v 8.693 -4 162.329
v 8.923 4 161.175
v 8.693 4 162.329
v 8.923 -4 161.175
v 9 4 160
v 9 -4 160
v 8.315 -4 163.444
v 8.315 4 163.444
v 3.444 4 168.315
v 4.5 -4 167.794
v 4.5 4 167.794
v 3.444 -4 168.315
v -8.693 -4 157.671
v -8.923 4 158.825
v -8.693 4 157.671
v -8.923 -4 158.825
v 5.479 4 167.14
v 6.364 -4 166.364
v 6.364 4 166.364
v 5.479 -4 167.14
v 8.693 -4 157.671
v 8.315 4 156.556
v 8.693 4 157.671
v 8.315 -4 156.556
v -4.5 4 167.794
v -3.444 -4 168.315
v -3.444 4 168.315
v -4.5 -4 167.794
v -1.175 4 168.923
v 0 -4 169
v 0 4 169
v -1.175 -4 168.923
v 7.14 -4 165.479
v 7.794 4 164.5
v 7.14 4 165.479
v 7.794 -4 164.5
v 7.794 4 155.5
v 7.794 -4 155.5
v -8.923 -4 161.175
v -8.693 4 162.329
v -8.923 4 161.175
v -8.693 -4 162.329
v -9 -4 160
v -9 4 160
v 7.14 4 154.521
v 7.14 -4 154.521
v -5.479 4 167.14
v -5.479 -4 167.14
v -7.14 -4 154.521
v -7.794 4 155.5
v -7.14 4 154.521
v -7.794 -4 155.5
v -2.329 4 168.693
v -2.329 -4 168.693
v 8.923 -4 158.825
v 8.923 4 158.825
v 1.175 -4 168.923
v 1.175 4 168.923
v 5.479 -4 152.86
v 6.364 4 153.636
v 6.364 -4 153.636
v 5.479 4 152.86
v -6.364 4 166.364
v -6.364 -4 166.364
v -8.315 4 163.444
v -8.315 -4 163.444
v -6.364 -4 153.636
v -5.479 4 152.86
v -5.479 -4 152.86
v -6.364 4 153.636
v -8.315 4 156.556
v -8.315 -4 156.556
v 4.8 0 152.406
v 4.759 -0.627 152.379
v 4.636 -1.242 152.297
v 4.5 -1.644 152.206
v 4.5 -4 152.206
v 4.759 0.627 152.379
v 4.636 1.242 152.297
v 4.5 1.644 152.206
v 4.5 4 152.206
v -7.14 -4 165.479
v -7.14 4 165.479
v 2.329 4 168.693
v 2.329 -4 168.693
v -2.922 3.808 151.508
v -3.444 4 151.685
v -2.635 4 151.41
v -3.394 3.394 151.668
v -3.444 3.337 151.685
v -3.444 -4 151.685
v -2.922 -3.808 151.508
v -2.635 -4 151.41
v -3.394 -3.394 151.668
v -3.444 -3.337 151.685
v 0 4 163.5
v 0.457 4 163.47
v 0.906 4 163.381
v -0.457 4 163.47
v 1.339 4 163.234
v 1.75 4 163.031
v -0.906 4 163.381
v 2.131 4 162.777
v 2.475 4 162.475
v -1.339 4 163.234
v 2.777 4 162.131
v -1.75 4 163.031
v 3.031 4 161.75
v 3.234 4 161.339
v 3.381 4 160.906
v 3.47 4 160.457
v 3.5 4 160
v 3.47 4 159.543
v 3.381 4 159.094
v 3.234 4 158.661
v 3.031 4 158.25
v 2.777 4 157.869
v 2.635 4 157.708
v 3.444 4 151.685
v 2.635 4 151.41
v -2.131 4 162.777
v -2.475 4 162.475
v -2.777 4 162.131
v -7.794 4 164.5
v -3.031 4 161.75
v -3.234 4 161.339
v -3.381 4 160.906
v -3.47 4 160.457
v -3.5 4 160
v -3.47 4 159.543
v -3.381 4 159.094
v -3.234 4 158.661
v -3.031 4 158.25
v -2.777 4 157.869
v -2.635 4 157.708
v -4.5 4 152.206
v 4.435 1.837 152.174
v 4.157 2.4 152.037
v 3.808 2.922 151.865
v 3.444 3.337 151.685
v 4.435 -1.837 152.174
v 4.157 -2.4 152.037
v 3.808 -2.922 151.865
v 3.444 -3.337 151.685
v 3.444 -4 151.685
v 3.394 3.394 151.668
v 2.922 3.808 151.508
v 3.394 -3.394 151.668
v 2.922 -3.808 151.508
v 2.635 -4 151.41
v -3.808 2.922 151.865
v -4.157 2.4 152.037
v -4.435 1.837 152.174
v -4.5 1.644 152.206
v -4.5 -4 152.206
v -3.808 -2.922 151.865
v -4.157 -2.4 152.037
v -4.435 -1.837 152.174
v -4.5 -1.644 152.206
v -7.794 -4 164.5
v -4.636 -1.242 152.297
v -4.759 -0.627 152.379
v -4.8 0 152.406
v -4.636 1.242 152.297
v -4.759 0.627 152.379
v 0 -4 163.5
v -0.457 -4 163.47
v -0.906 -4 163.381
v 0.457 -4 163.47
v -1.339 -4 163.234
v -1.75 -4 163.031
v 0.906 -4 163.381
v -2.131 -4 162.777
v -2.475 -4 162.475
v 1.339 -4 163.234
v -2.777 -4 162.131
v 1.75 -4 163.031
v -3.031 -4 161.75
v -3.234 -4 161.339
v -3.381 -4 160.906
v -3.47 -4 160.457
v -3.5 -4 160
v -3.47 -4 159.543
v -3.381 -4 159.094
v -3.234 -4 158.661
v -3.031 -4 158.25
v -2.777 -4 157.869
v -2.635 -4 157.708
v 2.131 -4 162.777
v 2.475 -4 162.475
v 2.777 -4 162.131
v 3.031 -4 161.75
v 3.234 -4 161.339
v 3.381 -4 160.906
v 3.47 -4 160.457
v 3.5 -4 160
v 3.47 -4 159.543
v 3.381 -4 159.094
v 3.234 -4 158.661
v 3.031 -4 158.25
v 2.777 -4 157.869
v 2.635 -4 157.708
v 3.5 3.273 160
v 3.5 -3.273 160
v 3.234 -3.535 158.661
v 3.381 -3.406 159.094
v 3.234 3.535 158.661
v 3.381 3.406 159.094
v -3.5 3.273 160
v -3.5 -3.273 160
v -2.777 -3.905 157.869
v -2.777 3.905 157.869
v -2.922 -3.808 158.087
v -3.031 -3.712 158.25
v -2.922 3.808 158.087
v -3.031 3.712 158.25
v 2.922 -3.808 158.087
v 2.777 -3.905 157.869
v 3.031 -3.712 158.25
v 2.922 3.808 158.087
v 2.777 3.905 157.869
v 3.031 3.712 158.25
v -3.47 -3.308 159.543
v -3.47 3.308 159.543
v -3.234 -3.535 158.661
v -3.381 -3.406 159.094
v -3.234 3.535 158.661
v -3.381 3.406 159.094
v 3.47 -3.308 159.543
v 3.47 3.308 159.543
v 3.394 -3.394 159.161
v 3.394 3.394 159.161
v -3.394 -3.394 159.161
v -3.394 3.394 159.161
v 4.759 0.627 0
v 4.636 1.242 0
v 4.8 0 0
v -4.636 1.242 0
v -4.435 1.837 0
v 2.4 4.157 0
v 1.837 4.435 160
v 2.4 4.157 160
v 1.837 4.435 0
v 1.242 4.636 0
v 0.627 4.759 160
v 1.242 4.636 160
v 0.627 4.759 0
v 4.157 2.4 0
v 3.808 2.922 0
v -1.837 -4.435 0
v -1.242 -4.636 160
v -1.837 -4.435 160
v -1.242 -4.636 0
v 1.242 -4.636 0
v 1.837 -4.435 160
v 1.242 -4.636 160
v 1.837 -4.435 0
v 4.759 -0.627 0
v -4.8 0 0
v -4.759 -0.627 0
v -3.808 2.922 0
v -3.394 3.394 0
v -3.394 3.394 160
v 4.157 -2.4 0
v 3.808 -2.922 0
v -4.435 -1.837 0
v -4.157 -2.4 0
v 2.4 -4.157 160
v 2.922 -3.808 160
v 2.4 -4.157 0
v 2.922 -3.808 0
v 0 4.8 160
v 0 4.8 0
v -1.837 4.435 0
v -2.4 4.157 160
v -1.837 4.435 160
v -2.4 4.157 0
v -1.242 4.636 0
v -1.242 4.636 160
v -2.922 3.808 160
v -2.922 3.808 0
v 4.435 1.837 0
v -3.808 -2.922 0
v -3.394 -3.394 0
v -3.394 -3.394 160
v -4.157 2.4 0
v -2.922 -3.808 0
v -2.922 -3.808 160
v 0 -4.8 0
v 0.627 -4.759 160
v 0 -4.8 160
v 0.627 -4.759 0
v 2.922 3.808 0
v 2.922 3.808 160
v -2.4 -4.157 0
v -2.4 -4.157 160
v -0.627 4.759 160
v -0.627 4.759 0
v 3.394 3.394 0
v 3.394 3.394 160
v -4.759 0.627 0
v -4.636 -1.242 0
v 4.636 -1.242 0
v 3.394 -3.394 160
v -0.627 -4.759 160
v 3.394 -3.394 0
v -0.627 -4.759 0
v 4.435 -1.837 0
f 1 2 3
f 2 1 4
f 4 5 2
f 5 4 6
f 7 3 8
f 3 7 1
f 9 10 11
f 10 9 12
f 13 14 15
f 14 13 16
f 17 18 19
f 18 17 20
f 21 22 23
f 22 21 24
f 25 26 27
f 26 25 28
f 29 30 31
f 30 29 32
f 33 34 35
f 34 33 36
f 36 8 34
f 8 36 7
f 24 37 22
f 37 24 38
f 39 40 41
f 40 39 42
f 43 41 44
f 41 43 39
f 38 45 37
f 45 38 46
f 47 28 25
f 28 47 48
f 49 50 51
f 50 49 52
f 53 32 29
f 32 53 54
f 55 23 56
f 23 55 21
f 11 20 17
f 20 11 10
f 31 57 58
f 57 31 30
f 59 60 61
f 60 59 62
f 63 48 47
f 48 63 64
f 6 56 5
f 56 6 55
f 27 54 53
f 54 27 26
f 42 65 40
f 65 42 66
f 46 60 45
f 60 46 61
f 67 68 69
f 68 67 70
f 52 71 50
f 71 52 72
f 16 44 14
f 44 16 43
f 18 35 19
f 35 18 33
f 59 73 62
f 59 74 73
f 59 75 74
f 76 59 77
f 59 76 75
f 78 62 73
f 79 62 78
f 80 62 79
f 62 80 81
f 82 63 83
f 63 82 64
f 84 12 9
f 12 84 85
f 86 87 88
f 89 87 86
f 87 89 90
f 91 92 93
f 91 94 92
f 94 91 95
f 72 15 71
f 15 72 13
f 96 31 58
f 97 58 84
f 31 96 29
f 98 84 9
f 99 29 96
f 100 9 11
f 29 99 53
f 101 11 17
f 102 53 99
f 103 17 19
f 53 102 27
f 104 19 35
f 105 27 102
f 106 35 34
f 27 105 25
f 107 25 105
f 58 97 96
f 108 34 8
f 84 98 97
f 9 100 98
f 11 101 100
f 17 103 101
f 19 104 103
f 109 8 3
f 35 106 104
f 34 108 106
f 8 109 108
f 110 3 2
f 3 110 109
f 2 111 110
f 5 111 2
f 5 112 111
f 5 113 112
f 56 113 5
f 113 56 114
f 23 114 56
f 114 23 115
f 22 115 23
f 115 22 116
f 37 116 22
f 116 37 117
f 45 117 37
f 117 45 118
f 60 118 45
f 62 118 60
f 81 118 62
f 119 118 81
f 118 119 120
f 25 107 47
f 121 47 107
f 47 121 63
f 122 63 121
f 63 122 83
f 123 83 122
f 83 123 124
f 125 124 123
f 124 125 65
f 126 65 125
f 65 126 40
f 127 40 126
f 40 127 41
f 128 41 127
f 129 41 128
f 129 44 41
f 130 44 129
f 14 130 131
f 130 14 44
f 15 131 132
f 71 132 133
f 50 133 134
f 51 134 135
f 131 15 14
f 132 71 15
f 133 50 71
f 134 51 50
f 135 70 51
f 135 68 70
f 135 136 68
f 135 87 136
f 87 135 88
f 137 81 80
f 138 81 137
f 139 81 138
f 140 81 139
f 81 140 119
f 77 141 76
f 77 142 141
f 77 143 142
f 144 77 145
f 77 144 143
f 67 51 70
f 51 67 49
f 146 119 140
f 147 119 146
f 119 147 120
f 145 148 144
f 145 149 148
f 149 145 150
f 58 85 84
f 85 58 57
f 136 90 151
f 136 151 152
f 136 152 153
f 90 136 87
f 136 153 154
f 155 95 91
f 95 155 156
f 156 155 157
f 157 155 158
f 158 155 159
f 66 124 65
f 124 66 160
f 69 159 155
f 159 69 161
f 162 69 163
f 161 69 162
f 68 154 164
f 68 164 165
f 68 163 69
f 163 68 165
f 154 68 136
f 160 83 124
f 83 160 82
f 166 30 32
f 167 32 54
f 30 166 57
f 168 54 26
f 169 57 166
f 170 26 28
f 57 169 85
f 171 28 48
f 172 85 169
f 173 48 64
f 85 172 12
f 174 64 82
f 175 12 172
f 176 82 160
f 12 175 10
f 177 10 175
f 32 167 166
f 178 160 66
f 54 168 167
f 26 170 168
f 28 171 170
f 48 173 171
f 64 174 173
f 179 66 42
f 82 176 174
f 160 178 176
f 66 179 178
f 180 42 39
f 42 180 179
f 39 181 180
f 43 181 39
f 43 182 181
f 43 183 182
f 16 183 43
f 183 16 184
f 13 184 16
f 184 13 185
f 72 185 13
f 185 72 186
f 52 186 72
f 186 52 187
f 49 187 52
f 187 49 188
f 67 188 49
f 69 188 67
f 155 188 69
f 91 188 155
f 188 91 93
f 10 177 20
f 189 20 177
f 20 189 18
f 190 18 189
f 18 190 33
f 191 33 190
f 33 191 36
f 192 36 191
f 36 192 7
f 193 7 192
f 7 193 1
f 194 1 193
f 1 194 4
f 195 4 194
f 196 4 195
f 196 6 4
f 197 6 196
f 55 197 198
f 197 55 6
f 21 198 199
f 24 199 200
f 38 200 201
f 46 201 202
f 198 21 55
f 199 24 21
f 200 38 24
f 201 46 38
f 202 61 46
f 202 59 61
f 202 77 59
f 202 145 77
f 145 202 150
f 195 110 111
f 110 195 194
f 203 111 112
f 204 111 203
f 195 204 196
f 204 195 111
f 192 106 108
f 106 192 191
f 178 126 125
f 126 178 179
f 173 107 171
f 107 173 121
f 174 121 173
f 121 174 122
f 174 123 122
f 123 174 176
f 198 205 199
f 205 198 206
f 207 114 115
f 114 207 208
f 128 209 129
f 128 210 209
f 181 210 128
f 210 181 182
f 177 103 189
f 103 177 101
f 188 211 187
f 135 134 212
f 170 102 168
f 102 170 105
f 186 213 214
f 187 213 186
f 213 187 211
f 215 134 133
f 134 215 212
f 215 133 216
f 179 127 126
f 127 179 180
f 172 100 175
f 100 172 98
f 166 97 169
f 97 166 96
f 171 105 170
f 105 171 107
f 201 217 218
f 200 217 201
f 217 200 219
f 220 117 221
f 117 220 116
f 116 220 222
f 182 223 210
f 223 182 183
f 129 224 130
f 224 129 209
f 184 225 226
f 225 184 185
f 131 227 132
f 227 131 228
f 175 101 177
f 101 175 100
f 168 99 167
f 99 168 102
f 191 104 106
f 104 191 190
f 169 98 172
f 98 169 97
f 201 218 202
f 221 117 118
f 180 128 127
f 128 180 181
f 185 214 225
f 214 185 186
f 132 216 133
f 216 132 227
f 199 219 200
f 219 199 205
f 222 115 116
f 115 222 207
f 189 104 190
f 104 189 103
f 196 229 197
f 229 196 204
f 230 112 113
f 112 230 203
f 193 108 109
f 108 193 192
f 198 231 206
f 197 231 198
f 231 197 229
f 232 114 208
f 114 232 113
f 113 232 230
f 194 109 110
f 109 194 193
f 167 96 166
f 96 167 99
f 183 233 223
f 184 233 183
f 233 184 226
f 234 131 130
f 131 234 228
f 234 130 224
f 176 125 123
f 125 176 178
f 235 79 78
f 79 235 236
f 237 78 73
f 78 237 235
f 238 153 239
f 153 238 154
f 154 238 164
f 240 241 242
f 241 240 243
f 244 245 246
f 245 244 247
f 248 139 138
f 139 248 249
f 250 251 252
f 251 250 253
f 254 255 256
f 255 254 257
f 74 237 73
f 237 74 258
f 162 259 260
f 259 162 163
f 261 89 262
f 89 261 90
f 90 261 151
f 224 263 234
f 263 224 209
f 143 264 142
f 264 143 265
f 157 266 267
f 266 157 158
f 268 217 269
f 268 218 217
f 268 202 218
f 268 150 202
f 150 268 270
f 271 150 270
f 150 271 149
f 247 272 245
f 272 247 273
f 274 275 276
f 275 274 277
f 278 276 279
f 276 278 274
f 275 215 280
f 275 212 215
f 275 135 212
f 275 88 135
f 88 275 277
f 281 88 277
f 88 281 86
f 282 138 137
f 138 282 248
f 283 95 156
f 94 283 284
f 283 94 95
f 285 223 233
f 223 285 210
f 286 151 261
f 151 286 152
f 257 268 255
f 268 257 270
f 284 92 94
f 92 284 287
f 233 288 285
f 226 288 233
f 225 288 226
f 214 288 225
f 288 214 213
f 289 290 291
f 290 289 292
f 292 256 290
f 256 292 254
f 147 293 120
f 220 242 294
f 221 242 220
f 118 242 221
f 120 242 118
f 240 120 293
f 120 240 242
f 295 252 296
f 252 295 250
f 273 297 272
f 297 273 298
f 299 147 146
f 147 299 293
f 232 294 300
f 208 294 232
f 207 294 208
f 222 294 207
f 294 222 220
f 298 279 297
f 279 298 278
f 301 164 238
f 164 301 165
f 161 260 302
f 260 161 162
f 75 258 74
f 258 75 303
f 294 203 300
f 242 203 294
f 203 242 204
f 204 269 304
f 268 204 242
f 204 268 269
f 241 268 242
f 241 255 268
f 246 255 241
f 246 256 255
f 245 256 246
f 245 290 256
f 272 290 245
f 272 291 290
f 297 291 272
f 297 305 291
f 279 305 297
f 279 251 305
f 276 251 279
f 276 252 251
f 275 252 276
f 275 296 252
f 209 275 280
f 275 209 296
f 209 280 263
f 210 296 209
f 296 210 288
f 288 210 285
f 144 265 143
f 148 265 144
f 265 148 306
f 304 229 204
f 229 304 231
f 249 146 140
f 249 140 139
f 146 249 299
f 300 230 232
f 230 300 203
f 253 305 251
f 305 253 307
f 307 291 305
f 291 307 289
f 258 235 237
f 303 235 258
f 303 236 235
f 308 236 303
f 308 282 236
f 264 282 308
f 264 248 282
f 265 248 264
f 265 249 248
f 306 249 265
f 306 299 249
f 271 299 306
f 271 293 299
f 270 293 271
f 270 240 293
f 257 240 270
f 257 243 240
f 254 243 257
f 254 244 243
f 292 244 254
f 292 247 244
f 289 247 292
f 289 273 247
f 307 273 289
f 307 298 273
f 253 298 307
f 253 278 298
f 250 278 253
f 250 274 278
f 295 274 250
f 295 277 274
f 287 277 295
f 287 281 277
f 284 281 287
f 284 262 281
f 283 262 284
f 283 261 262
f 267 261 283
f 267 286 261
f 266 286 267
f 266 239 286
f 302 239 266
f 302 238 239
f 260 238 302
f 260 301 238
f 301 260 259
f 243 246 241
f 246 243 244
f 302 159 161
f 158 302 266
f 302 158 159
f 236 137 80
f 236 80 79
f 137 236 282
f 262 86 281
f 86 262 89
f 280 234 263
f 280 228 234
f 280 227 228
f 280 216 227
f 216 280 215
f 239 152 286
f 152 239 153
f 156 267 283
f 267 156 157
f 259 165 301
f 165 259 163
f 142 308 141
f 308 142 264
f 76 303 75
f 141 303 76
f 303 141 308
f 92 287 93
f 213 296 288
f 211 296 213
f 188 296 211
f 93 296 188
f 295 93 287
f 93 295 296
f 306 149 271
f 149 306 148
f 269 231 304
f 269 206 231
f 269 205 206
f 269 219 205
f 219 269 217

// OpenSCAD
// TS-PET-C10 - Teaser Arm Rod
$fn = 48; rod_d=9.6; rod_len=160; eye_d=18; eye_hole_d=7;
union(){ cylinder(h=rod_len,d=rod_d); translate([0,0,rod_len]) rotate([90,0,0]) difference(){ cylinder(h=8,d=eye_d,center=true); cylinder(h=10,d=eye_hole_d,center=true); } }
